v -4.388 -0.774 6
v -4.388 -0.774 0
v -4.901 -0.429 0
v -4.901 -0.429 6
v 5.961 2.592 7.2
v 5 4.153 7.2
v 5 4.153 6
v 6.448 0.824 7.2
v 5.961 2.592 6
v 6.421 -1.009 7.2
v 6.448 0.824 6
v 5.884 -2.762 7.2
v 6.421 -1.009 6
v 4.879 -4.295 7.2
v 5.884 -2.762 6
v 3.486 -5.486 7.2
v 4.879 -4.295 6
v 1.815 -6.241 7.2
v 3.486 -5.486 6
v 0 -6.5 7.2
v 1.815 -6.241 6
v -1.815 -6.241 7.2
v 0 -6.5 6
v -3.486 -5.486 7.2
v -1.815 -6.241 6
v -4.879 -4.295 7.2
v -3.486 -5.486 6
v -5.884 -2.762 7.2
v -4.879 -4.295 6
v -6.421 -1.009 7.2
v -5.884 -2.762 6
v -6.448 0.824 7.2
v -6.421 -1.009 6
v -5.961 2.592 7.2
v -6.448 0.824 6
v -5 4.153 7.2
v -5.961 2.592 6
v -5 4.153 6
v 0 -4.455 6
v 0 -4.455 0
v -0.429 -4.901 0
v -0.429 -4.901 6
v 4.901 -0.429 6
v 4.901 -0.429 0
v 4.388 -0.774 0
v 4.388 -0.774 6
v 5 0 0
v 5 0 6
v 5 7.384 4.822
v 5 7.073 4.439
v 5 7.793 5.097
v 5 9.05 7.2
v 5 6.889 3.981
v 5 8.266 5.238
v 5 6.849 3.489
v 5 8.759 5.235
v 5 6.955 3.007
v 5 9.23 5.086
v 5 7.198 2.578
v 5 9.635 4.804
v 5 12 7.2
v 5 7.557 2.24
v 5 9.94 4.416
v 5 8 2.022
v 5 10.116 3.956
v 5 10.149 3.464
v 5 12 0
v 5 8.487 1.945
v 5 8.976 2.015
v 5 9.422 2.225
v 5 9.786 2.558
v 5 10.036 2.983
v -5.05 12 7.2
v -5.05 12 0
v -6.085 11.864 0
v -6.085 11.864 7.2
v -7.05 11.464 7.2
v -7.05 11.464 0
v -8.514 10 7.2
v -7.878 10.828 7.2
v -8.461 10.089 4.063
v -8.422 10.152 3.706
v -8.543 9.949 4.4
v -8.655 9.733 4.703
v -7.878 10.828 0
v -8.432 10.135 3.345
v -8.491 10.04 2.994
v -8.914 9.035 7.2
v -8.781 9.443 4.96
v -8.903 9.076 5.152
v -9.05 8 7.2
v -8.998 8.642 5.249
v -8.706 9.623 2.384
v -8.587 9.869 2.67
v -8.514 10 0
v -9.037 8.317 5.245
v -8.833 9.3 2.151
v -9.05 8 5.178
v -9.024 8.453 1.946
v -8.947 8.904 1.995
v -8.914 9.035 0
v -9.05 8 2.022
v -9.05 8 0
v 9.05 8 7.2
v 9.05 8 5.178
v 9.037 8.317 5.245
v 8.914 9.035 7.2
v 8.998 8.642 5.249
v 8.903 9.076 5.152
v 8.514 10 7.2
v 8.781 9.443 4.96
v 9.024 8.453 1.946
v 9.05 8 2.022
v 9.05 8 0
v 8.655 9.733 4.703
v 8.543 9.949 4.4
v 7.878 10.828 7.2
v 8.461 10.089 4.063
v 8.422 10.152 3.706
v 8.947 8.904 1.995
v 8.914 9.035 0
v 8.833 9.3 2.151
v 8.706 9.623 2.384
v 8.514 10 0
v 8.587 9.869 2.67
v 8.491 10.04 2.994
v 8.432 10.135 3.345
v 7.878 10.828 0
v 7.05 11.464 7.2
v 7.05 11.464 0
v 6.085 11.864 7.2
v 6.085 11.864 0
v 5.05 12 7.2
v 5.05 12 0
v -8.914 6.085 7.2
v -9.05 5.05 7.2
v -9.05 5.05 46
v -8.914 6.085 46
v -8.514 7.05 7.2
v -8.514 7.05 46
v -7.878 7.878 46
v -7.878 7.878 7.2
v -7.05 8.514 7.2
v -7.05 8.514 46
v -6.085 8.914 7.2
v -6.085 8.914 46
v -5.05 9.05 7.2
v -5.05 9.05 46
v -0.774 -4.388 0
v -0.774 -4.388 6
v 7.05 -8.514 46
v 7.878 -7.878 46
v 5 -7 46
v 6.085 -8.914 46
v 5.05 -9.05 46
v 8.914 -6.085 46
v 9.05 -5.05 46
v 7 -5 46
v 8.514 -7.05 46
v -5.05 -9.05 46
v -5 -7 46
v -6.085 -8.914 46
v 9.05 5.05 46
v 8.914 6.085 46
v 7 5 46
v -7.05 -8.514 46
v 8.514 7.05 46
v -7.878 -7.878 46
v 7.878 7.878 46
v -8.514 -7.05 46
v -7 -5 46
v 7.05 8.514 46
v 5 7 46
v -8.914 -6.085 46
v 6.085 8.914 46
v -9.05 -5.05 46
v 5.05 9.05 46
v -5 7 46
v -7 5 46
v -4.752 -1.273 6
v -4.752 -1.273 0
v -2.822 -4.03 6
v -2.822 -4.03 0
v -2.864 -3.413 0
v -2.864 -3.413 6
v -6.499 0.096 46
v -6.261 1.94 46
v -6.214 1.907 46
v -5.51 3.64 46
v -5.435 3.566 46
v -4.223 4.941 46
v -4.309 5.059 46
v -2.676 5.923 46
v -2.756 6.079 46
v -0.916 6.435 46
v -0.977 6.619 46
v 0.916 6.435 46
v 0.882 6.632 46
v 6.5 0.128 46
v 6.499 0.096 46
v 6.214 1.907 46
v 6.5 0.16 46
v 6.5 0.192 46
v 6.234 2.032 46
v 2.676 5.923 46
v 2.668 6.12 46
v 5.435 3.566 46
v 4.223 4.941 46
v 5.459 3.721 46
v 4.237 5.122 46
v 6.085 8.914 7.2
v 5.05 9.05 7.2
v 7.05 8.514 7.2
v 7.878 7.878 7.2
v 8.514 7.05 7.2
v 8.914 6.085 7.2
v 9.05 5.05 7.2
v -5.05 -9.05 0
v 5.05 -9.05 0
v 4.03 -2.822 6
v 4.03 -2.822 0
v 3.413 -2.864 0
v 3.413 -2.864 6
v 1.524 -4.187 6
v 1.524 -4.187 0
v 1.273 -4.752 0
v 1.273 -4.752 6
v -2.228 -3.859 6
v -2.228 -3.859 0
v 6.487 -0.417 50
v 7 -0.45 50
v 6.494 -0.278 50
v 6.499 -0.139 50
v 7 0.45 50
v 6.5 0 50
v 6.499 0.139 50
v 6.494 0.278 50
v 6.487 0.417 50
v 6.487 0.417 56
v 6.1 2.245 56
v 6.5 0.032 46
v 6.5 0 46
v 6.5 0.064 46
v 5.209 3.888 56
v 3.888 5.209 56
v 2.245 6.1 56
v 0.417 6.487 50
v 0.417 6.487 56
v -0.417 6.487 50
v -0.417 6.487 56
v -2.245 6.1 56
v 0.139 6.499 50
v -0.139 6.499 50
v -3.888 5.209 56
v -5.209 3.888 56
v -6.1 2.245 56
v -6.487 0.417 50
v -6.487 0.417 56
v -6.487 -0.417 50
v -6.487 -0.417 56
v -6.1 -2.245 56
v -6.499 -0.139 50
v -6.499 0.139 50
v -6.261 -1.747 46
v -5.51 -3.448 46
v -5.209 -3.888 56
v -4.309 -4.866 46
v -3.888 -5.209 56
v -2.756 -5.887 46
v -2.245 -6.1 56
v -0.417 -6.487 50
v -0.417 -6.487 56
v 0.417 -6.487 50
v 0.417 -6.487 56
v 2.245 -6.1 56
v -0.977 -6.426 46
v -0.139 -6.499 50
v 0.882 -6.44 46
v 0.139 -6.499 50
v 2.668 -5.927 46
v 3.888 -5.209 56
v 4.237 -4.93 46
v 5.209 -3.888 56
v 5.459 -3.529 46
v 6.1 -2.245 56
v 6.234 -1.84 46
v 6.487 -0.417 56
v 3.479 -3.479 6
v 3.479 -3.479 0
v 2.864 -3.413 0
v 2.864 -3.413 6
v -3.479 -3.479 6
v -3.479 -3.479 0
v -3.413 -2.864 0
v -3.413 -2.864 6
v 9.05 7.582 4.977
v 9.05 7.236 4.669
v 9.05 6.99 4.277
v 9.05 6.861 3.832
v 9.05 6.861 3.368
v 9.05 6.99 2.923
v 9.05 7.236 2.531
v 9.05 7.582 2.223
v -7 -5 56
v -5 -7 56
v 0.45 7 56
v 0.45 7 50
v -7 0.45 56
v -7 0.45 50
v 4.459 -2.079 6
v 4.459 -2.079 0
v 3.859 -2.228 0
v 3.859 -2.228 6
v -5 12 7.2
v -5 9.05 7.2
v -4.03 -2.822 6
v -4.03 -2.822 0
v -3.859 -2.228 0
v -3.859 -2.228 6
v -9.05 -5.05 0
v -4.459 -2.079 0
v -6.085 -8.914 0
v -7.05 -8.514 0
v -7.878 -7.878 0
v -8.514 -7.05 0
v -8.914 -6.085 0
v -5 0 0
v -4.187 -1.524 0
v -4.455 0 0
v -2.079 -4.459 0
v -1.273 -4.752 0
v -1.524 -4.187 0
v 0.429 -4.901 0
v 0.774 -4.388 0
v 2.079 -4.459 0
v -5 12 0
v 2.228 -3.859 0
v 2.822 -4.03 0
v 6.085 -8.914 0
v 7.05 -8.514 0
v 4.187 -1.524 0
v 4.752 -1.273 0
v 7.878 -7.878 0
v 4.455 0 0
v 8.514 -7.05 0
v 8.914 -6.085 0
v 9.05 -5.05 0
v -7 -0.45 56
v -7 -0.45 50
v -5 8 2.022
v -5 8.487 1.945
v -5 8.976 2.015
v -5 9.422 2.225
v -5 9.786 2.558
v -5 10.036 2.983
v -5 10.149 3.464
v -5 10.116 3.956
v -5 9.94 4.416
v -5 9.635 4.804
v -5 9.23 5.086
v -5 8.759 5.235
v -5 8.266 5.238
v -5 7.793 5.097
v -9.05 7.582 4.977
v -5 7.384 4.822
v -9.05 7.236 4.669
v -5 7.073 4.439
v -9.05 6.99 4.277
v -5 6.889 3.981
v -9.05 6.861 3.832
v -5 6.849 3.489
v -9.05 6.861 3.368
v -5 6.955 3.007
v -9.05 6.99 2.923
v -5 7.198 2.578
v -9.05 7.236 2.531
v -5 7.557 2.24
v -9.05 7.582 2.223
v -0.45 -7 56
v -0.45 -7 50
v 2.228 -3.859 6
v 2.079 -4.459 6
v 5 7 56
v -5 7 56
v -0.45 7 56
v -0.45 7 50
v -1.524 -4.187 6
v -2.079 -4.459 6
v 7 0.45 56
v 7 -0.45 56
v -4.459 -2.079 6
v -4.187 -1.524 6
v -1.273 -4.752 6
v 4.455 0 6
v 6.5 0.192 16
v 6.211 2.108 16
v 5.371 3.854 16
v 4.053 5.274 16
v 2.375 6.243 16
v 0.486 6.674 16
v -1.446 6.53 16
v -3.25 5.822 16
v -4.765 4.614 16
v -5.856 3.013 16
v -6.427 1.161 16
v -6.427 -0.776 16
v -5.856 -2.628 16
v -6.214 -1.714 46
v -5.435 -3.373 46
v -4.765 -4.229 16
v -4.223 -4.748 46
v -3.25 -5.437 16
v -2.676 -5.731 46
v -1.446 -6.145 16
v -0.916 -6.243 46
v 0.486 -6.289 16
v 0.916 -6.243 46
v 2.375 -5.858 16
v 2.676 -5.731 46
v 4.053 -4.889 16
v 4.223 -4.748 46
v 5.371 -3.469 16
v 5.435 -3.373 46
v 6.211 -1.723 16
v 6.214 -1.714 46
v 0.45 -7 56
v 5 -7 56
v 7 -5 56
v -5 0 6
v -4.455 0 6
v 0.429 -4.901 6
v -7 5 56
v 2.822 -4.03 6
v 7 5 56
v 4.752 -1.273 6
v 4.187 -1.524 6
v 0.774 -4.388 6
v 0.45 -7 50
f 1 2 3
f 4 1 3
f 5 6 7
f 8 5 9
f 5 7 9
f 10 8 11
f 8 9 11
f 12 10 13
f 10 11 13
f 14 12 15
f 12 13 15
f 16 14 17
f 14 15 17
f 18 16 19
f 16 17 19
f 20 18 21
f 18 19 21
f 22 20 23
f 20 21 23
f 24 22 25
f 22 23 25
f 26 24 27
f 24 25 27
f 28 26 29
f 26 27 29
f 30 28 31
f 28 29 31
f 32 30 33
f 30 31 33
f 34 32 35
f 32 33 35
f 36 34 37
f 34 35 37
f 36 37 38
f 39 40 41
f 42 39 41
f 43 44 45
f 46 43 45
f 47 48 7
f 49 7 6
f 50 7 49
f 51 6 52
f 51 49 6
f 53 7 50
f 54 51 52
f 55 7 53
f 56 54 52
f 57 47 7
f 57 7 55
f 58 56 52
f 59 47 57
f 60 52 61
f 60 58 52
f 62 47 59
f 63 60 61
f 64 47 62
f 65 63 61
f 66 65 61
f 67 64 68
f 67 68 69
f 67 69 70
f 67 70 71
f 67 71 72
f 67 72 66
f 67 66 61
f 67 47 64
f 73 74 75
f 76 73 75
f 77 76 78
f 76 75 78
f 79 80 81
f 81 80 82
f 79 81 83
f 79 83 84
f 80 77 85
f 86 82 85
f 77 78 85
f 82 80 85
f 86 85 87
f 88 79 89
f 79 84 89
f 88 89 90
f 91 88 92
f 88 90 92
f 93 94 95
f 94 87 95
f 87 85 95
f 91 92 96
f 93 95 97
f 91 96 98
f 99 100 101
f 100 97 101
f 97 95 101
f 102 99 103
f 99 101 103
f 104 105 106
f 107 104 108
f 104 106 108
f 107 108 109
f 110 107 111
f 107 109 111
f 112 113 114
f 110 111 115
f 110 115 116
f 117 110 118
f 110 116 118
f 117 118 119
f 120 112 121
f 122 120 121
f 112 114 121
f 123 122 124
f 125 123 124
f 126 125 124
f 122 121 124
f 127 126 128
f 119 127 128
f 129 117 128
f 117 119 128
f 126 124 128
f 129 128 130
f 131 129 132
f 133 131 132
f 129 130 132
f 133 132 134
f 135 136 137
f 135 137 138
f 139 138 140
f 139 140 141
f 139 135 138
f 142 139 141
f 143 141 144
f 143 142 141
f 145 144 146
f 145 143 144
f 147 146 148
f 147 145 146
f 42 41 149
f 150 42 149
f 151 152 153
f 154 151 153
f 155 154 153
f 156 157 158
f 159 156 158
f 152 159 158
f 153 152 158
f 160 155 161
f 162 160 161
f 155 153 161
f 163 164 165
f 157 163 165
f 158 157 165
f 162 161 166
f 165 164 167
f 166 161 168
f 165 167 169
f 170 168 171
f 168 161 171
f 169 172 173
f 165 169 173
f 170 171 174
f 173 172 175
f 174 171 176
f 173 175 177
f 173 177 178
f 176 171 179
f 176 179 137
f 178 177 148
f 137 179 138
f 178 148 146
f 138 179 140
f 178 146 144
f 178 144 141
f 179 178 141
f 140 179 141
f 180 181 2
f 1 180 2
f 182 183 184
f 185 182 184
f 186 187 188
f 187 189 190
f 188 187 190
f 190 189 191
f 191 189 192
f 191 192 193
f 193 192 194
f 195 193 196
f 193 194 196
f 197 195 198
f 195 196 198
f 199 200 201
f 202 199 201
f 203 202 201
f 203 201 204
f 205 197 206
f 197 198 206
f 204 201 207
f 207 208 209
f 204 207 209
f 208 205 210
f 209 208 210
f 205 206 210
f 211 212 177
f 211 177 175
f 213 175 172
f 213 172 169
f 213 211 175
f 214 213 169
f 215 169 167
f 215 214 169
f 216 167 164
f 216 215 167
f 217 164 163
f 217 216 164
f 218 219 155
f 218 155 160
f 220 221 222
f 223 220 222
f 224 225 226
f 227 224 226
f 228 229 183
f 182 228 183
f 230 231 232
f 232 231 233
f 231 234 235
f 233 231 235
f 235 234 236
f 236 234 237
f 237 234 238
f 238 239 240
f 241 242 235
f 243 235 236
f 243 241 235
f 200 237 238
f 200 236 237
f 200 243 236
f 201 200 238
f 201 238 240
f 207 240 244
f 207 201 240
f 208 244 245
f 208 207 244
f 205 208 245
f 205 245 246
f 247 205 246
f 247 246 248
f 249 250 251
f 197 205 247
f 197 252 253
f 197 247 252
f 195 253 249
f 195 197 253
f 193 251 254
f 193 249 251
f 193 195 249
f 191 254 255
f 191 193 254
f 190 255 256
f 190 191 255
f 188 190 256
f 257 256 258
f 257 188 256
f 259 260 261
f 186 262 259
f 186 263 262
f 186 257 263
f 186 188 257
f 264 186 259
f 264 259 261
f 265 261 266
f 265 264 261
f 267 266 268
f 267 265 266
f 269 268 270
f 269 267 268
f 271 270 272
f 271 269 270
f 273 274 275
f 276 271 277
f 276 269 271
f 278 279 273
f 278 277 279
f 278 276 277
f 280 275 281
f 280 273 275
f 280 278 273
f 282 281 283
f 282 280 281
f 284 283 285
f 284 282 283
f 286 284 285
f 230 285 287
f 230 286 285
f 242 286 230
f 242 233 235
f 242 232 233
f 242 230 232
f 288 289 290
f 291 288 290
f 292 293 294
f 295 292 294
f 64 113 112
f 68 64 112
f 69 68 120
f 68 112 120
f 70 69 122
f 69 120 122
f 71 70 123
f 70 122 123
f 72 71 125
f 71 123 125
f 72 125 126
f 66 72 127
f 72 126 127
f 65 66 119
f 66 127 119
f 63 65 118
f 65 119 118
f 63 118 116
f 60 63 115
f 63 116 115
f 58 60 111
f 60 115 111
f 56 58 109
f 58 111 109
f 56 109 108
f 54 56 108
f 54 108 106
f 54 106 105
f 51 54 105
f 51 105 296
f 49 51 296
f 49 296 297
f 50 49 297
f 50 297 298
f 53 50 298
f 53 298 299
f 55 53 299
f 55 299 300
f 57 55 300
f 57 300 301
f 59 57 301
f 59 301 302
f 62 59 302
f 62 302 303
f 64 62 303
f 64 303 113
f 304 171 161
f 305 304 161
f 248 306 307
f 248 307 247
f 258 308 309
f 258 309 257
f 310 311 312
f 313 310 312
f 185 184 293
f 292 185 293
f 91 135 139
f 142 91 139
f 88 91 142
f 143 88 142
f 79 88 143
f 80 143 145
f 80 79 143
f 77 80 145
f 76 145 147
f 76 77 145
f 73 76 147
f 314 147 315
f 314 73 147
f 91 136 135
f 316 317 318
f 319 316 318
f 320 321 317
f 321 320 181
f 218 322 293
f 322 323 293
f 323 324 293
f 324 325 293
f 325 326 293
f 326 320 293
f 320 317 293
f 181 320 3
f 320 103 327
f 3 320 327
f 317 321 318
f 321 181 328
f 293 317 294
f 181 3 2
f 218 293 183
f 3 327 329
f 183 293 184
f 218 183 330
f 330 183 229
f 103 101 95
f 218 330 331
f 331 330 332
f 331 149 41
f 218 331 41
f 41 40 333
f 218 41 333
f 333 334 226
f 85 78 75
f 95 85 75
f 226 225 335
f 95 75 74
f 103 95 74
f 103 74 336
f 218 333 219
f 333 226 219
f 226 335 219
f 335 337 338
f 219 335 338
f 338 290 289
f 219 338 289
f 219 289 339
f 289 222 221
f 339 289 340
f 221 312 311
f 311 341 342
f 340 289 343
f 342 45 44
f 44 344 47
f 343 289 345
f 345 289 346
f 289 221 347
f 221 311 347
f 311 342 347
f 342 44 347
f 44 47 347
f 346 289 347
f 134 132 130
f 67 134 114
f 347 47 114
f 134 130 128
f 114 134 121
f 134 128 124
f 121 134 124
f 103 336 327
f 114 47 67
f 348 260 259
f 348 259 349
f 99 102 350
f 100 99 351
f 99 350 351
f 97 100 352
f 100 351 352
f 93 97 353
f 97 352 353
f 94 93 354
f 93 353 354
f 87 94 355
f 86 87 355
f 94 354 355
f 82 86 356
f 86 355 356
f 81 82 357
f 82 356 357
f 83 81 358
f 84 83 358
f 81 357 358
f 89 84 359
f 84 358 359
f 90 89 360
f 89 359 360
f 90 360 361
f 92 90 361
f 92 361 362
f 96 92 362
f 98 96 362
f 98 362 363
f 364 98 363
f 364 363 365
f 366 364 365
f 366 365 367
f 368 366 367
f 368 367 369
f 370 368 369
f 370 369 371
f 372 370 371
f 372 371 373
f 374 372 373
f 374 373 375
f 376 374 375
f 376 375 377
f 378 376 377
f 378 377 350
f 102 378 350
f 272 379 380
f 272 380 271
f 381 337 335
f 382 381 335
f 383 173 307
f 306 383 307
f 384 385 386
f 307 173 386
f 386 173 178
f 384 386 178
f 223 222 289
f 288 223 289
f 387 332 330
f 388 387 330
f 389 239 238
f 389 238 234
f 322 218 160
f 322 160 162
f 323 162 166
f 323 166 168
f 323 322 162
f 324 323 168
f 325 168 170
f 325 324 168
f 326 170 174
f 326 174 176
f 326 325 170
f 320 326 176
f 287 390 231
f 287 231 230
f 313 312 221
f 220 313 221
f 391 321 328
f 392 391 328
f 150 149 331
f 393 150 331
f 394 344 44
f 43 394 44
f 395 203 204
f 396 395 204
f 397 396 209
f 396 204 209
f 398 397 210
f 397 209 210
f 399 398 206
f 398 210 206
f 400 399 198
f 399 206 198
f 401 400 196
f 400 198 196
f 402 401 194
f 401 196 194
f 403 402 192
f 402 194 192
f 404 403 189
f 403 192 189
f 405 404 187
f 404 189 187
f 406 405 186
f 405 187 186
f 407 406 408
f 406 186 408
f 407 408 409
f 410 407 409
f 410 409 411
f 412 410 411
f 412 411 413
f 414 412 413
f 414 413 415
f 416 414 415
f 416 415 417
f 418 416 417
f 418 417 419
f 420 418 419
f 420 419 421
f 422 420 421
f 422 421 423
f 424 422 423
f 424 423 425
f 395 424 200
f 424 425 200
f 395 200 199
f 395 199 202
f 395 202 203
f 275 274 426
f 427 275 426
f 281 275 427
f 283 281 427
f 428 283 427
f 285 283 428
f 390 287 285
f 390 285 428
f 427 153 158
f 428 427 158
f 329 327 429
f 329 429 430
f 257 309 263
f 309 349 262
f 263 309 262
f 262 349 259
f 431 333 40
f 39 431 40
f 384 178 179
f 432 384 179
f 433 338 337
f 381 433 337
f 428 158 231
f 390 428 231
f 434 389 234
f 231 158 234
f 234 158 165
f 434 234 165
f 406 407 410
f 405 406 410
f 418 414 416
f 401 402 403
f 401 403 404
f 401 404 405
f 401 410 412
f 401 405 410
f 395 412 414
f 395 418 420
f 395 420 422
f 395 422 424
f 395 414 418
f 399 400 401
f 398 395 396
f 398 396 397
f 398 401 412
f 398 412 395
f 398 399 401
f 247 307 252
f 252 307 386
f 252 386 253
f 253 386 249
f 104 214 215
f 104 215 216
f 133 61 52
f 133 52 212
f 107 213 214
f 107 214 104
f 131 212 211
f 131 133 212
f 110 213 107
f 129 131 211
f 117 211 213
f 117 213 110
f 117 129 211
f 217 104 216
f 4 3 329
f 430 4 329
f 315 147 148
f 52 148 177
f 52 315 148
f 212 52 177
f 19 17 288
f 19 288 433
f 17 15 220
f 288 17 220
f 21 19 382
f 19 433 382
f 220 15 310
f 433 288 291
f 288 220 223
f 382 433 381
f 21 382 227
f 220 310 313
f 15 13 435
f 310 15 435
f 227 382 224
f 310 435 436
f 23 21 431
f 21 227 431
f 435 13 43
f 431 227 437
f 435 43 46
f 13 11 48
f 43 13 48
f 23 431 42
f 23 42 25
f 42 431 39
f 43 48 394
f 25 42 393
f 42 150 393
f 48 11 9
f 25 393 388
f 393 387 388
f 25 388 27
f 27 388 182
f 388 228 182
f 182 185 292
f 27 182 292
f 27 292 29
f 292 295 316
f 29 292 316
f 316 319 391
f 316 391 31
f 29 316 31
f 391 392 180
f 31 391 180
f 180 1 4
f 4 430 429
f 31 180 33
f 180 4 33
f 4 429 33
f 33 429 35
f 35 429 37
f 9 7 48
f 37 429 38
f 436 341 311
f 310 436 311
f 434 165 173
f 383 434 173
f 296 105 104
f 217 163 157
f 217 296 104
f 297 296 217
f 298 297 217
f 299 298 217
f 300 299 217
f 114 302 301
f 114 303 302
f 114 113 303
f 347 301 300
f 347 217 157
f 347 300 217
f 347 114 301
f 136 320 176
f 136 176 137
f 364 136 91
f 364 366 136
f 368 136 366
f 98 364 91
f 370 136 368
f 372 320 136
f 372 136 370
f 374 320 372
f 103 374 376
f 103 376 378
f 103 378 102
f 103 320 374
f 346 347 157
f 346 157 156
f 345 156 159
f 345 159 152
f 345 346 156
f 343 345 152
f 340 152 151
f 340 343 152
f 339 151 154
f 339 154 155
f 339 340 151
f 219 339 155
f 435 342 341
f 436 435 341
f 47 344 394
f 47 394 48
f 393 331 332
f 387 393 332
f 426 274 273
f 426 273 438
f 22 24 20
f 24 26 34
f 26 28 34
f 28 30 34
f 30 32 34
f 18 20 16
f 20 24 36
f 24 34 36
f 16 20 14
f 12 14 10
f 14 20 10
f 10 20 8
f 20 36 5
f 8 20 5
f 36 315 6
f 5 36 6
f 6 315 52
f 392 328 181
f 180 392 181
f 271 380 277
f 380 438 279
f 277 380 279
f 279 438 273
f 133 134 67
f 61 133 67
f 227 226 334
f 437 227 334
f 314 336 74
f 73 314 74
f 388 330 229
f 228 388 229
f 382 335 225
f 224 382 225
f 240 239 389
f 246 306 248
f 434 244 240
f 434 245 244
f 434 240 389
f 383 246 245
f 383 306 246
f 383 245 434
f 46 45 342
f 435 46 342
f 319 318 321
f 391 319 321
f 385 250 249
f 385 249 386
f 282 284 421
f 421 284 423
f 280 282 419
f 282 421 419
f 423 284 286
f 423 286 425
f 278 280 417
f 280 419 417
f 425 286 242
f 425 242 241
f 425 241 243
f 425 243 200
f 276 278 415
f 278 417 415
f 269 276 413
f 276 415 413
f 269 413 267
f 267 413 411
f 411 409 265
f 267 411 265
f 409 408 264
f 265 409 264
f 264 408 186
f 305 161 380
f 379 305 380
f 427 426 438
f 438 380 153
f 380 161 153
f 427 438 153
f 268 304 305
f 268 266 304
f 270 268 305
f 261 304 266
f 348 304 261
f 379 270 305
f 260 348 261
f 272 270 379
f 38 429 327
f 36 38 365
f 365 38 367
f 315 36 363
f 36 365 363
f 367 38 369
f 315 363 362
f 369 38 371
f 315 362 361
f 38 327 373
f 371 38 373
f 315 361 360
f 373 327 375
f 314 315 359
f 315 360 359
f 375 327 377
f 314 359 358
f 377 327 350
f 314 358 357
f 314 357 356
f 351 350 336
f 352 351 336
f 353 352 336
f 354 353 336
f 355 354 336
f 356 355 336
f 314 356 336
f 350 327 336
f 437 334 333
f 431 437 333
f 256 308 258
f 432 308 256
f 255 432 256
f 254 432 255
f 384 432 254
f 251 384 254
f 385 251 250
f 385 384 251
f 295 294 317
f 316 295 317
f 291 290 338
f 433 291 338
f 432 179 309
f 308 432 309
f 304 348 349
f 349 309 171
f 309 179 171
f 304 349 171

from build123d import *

# Parameters (mm, degrees)
BOSS_EXTRUDE1_DEPTH = 46
SKETCH3_R           = 6.5
BOSS_EXTRUDE2_DEPTH = 10
CUT_EXTRUDE7_DEPTH  = 6
CIRPATTERN1_COUNT   = 4
SKETCH12_R          = 6.5
CUT_EXTRUDE8_DEPTH  = 30
BOSS_EXTRUDE3_DEPTH = 7.2
SKETCH17_R          = 1.655
CUT_EXTRUDE10_DEPTH = 30
SKETCH18_R          = 5
CUT_EXTRUDE11_DEPTH = 6
BOSS_EXTRUDE4_DEPTH = 6
CIRPATTERN2_COUNT   = 36
SKETCH20_R          = 6.5
CUT_EXTRUDE12_DEPTH = 1.2
SKETCH21_W          = 10
SKETCH21_H          = 17.493725323
CUT_EXTRUDE13_DEPTH = 7.2


with BuildPart() as part:
    # Sketch1 → Boss-Extrude1 (new body)
    with BuildSketch(Plane.XY):
        with BuildLine():
            Line((-5.05, 9.05), (5.05, 9.05))
            ThreePointArc((5.05, 9.05), (7.878427125, 7.878427125), (9.05, 5.05))
            Line((9.05, 5.05), (9.05, -5.05))
            ThreePointArc((9.05, -5.05), (7.878427125, -7.878427125), (5.05, -9.05))
            Line((5.05, -9.05), (-5.05, -9.05))
            ThreePointArc((-5.05, -9.05), (-7.878427125, -7.878427125), (-9.05, -5.05))
            Line((-9.05, -5.05), (-9.05, 5.05))
            ThreePointArc((-9.05, 5.05), (-7.878427125, 7.878427125), (-5.05, 9.05))
        make_face()
    extrude(amount=BOSS_EXTRUDE1_DEPTH)

    # Sketch3 → Boss-Extrude2 (add)
    with BuildSketch(Plane.XY.offset(46)):
        Polygon((-5, -7), (5, -7), (7, -5), (7, 5), (5, 7), (-5, 7), (-7, 5), (-7, -5), align=None)
        Circle(SKETCH3_R, mode=Mode.SUBTRACT)
    extrude(amount=BOSS_EXTRUDE2_DEPTH)

    # Sketch11 → Cut-Extrude7 (cut)
    with BuildSketch(Plane.XY.offset(56)):
        Polygon((0, 0), (7, 0.45), (7, -0.45), align=None)
    cut_extrude7 = extrude(amount=-CUT_EXTRUDE7_DEPTH, mode=Mode.SUBTRACT)

    # CirPattern1: Cut-Extrude7 ×4 about axis
    cirpattern1_axis = Axis((0, 0, 56), (0, 0, -1))
    for i in range(1, CIRPATTERN1_COUNT):
        add(cut_extrude7.rotate(cirpattern1_axis, i * 360 / CIRPATTERN1_COUNT), mode=Mode.SUBTRACT)

    # Sketch12 → Cut-Extrude8 (cut)
    with BuildSketch(Plane.XY.offset(46)):
        with Locations((0, 0.192488852)):
            Circle(SKETCH12_R)
    extrude(amount=-CUT_EXTRUDE8_DEPTH, mode=Mode.SUBTRACT)

    # Sketch15 → Boss-Extrude3 (add)
    with BuildSketch(Plane.XY):
        with BuildLine():
            Line((-5.05, -9.05), (5.05, -9.05))
            ThreePointArc((5.05, -9.05), (7.878427125, -7.878427125), (9.05, -5.05))
            Line((9.05, -5.05), (9.05, 8))
            ThreePointArc((9.05, 8), (7.878427125, 10.828427125), (5.05, 12))
            Line((5.05, 12), (-5.05, 12))
            ThreePointArc((-5.05, 12), (-7.878427125, 10.828427125), (-9.05, 8))
            Line((-9.05, 8), (-9.05, -5.05))
            ThreePointArc((-9.05, -5.05), (-7.878427125, -7.878427125), (-5.05, -9.05))
        make_face()
    extrude(amount=BOSS_EXTRUDE3_DEPTH)

    # Sketch17 → Cut-Extrude10 (cut)
    with BuildSketch(Plane(origin=(9.05, 0, 0), x_dir=(0, 0, -1), z_dir=(1, 0, 0))):
        with Locations(Location((-3.6, 8.5, 0), (0, 0, 342.4153325))):
            Circle(SKETCH17_R)
    extrude(amount=-CUT_EXTRUDE10_DEPTH, mode=Mode.SUBTRACT)

    # Sketch18 → Cut-Extrude11 (cut)
    with BuildSketch(Plane.XY):
        Circle(SKETCH18_R)
    extrude(amount=CUT_EXTRUDE11_DEPTH, mode=Mode.SUBTRACT)

    # Sketch19 → Boss-Extrude4 (add)
    with BuildSketch(Plane.XY):
        with BuildLine():
            Line((-0.5, 4.974937186), (0, 4.455493066))
            Line((0, 4.455493066), (0.5, 4.974937186))
            ThreePointArc((0.5, 4.974937186), (0, 5.474937186), (-0.5, 4.974937186))
        make_face()
    boss_extrude4 = extrude(amount=BOSS_EXTRUDE4_DEPTH)

    # CirPattern2: Boss-Extrude4 ×36 about axis
    cirpattern2_axis = Axis((0, 0, 0), (0, 0, 1))
    for i in range(1, CIRPATTERN2_COUNT):
        add(boss_extrude4.rotate(cirpattern2_axis, i * 360 / CIRPATTERN2_COUNT))

    # Sketch20 → Cut-Extrude12 (cut)
    with BuildSketch(Plane(origin=(0, 0, 6), x_dir=(-1, 0, 0), z_dir=(0, 0, -1))):
        with Locations(Location((0, 0, 0), (0, 0, 0.848400141))):
            Circle(SKETCH20_R)
    extrude(amount=-CUT_EXTRUDE12_DEPTH, mode=Mode.SUBTRACT)

    # Sketch21 → Cut-Extrude13 (cut)
    with BuildSketch(Plane.XY):
        with Locations((0, 8.746862661)):
            Rectangle(SKETCH21_W, SKETCH21_H)
    extrude(amount=CUT_EXTRUDE13_DEPTH, mode=Mode.SUBTRACT)


solid = part.part
